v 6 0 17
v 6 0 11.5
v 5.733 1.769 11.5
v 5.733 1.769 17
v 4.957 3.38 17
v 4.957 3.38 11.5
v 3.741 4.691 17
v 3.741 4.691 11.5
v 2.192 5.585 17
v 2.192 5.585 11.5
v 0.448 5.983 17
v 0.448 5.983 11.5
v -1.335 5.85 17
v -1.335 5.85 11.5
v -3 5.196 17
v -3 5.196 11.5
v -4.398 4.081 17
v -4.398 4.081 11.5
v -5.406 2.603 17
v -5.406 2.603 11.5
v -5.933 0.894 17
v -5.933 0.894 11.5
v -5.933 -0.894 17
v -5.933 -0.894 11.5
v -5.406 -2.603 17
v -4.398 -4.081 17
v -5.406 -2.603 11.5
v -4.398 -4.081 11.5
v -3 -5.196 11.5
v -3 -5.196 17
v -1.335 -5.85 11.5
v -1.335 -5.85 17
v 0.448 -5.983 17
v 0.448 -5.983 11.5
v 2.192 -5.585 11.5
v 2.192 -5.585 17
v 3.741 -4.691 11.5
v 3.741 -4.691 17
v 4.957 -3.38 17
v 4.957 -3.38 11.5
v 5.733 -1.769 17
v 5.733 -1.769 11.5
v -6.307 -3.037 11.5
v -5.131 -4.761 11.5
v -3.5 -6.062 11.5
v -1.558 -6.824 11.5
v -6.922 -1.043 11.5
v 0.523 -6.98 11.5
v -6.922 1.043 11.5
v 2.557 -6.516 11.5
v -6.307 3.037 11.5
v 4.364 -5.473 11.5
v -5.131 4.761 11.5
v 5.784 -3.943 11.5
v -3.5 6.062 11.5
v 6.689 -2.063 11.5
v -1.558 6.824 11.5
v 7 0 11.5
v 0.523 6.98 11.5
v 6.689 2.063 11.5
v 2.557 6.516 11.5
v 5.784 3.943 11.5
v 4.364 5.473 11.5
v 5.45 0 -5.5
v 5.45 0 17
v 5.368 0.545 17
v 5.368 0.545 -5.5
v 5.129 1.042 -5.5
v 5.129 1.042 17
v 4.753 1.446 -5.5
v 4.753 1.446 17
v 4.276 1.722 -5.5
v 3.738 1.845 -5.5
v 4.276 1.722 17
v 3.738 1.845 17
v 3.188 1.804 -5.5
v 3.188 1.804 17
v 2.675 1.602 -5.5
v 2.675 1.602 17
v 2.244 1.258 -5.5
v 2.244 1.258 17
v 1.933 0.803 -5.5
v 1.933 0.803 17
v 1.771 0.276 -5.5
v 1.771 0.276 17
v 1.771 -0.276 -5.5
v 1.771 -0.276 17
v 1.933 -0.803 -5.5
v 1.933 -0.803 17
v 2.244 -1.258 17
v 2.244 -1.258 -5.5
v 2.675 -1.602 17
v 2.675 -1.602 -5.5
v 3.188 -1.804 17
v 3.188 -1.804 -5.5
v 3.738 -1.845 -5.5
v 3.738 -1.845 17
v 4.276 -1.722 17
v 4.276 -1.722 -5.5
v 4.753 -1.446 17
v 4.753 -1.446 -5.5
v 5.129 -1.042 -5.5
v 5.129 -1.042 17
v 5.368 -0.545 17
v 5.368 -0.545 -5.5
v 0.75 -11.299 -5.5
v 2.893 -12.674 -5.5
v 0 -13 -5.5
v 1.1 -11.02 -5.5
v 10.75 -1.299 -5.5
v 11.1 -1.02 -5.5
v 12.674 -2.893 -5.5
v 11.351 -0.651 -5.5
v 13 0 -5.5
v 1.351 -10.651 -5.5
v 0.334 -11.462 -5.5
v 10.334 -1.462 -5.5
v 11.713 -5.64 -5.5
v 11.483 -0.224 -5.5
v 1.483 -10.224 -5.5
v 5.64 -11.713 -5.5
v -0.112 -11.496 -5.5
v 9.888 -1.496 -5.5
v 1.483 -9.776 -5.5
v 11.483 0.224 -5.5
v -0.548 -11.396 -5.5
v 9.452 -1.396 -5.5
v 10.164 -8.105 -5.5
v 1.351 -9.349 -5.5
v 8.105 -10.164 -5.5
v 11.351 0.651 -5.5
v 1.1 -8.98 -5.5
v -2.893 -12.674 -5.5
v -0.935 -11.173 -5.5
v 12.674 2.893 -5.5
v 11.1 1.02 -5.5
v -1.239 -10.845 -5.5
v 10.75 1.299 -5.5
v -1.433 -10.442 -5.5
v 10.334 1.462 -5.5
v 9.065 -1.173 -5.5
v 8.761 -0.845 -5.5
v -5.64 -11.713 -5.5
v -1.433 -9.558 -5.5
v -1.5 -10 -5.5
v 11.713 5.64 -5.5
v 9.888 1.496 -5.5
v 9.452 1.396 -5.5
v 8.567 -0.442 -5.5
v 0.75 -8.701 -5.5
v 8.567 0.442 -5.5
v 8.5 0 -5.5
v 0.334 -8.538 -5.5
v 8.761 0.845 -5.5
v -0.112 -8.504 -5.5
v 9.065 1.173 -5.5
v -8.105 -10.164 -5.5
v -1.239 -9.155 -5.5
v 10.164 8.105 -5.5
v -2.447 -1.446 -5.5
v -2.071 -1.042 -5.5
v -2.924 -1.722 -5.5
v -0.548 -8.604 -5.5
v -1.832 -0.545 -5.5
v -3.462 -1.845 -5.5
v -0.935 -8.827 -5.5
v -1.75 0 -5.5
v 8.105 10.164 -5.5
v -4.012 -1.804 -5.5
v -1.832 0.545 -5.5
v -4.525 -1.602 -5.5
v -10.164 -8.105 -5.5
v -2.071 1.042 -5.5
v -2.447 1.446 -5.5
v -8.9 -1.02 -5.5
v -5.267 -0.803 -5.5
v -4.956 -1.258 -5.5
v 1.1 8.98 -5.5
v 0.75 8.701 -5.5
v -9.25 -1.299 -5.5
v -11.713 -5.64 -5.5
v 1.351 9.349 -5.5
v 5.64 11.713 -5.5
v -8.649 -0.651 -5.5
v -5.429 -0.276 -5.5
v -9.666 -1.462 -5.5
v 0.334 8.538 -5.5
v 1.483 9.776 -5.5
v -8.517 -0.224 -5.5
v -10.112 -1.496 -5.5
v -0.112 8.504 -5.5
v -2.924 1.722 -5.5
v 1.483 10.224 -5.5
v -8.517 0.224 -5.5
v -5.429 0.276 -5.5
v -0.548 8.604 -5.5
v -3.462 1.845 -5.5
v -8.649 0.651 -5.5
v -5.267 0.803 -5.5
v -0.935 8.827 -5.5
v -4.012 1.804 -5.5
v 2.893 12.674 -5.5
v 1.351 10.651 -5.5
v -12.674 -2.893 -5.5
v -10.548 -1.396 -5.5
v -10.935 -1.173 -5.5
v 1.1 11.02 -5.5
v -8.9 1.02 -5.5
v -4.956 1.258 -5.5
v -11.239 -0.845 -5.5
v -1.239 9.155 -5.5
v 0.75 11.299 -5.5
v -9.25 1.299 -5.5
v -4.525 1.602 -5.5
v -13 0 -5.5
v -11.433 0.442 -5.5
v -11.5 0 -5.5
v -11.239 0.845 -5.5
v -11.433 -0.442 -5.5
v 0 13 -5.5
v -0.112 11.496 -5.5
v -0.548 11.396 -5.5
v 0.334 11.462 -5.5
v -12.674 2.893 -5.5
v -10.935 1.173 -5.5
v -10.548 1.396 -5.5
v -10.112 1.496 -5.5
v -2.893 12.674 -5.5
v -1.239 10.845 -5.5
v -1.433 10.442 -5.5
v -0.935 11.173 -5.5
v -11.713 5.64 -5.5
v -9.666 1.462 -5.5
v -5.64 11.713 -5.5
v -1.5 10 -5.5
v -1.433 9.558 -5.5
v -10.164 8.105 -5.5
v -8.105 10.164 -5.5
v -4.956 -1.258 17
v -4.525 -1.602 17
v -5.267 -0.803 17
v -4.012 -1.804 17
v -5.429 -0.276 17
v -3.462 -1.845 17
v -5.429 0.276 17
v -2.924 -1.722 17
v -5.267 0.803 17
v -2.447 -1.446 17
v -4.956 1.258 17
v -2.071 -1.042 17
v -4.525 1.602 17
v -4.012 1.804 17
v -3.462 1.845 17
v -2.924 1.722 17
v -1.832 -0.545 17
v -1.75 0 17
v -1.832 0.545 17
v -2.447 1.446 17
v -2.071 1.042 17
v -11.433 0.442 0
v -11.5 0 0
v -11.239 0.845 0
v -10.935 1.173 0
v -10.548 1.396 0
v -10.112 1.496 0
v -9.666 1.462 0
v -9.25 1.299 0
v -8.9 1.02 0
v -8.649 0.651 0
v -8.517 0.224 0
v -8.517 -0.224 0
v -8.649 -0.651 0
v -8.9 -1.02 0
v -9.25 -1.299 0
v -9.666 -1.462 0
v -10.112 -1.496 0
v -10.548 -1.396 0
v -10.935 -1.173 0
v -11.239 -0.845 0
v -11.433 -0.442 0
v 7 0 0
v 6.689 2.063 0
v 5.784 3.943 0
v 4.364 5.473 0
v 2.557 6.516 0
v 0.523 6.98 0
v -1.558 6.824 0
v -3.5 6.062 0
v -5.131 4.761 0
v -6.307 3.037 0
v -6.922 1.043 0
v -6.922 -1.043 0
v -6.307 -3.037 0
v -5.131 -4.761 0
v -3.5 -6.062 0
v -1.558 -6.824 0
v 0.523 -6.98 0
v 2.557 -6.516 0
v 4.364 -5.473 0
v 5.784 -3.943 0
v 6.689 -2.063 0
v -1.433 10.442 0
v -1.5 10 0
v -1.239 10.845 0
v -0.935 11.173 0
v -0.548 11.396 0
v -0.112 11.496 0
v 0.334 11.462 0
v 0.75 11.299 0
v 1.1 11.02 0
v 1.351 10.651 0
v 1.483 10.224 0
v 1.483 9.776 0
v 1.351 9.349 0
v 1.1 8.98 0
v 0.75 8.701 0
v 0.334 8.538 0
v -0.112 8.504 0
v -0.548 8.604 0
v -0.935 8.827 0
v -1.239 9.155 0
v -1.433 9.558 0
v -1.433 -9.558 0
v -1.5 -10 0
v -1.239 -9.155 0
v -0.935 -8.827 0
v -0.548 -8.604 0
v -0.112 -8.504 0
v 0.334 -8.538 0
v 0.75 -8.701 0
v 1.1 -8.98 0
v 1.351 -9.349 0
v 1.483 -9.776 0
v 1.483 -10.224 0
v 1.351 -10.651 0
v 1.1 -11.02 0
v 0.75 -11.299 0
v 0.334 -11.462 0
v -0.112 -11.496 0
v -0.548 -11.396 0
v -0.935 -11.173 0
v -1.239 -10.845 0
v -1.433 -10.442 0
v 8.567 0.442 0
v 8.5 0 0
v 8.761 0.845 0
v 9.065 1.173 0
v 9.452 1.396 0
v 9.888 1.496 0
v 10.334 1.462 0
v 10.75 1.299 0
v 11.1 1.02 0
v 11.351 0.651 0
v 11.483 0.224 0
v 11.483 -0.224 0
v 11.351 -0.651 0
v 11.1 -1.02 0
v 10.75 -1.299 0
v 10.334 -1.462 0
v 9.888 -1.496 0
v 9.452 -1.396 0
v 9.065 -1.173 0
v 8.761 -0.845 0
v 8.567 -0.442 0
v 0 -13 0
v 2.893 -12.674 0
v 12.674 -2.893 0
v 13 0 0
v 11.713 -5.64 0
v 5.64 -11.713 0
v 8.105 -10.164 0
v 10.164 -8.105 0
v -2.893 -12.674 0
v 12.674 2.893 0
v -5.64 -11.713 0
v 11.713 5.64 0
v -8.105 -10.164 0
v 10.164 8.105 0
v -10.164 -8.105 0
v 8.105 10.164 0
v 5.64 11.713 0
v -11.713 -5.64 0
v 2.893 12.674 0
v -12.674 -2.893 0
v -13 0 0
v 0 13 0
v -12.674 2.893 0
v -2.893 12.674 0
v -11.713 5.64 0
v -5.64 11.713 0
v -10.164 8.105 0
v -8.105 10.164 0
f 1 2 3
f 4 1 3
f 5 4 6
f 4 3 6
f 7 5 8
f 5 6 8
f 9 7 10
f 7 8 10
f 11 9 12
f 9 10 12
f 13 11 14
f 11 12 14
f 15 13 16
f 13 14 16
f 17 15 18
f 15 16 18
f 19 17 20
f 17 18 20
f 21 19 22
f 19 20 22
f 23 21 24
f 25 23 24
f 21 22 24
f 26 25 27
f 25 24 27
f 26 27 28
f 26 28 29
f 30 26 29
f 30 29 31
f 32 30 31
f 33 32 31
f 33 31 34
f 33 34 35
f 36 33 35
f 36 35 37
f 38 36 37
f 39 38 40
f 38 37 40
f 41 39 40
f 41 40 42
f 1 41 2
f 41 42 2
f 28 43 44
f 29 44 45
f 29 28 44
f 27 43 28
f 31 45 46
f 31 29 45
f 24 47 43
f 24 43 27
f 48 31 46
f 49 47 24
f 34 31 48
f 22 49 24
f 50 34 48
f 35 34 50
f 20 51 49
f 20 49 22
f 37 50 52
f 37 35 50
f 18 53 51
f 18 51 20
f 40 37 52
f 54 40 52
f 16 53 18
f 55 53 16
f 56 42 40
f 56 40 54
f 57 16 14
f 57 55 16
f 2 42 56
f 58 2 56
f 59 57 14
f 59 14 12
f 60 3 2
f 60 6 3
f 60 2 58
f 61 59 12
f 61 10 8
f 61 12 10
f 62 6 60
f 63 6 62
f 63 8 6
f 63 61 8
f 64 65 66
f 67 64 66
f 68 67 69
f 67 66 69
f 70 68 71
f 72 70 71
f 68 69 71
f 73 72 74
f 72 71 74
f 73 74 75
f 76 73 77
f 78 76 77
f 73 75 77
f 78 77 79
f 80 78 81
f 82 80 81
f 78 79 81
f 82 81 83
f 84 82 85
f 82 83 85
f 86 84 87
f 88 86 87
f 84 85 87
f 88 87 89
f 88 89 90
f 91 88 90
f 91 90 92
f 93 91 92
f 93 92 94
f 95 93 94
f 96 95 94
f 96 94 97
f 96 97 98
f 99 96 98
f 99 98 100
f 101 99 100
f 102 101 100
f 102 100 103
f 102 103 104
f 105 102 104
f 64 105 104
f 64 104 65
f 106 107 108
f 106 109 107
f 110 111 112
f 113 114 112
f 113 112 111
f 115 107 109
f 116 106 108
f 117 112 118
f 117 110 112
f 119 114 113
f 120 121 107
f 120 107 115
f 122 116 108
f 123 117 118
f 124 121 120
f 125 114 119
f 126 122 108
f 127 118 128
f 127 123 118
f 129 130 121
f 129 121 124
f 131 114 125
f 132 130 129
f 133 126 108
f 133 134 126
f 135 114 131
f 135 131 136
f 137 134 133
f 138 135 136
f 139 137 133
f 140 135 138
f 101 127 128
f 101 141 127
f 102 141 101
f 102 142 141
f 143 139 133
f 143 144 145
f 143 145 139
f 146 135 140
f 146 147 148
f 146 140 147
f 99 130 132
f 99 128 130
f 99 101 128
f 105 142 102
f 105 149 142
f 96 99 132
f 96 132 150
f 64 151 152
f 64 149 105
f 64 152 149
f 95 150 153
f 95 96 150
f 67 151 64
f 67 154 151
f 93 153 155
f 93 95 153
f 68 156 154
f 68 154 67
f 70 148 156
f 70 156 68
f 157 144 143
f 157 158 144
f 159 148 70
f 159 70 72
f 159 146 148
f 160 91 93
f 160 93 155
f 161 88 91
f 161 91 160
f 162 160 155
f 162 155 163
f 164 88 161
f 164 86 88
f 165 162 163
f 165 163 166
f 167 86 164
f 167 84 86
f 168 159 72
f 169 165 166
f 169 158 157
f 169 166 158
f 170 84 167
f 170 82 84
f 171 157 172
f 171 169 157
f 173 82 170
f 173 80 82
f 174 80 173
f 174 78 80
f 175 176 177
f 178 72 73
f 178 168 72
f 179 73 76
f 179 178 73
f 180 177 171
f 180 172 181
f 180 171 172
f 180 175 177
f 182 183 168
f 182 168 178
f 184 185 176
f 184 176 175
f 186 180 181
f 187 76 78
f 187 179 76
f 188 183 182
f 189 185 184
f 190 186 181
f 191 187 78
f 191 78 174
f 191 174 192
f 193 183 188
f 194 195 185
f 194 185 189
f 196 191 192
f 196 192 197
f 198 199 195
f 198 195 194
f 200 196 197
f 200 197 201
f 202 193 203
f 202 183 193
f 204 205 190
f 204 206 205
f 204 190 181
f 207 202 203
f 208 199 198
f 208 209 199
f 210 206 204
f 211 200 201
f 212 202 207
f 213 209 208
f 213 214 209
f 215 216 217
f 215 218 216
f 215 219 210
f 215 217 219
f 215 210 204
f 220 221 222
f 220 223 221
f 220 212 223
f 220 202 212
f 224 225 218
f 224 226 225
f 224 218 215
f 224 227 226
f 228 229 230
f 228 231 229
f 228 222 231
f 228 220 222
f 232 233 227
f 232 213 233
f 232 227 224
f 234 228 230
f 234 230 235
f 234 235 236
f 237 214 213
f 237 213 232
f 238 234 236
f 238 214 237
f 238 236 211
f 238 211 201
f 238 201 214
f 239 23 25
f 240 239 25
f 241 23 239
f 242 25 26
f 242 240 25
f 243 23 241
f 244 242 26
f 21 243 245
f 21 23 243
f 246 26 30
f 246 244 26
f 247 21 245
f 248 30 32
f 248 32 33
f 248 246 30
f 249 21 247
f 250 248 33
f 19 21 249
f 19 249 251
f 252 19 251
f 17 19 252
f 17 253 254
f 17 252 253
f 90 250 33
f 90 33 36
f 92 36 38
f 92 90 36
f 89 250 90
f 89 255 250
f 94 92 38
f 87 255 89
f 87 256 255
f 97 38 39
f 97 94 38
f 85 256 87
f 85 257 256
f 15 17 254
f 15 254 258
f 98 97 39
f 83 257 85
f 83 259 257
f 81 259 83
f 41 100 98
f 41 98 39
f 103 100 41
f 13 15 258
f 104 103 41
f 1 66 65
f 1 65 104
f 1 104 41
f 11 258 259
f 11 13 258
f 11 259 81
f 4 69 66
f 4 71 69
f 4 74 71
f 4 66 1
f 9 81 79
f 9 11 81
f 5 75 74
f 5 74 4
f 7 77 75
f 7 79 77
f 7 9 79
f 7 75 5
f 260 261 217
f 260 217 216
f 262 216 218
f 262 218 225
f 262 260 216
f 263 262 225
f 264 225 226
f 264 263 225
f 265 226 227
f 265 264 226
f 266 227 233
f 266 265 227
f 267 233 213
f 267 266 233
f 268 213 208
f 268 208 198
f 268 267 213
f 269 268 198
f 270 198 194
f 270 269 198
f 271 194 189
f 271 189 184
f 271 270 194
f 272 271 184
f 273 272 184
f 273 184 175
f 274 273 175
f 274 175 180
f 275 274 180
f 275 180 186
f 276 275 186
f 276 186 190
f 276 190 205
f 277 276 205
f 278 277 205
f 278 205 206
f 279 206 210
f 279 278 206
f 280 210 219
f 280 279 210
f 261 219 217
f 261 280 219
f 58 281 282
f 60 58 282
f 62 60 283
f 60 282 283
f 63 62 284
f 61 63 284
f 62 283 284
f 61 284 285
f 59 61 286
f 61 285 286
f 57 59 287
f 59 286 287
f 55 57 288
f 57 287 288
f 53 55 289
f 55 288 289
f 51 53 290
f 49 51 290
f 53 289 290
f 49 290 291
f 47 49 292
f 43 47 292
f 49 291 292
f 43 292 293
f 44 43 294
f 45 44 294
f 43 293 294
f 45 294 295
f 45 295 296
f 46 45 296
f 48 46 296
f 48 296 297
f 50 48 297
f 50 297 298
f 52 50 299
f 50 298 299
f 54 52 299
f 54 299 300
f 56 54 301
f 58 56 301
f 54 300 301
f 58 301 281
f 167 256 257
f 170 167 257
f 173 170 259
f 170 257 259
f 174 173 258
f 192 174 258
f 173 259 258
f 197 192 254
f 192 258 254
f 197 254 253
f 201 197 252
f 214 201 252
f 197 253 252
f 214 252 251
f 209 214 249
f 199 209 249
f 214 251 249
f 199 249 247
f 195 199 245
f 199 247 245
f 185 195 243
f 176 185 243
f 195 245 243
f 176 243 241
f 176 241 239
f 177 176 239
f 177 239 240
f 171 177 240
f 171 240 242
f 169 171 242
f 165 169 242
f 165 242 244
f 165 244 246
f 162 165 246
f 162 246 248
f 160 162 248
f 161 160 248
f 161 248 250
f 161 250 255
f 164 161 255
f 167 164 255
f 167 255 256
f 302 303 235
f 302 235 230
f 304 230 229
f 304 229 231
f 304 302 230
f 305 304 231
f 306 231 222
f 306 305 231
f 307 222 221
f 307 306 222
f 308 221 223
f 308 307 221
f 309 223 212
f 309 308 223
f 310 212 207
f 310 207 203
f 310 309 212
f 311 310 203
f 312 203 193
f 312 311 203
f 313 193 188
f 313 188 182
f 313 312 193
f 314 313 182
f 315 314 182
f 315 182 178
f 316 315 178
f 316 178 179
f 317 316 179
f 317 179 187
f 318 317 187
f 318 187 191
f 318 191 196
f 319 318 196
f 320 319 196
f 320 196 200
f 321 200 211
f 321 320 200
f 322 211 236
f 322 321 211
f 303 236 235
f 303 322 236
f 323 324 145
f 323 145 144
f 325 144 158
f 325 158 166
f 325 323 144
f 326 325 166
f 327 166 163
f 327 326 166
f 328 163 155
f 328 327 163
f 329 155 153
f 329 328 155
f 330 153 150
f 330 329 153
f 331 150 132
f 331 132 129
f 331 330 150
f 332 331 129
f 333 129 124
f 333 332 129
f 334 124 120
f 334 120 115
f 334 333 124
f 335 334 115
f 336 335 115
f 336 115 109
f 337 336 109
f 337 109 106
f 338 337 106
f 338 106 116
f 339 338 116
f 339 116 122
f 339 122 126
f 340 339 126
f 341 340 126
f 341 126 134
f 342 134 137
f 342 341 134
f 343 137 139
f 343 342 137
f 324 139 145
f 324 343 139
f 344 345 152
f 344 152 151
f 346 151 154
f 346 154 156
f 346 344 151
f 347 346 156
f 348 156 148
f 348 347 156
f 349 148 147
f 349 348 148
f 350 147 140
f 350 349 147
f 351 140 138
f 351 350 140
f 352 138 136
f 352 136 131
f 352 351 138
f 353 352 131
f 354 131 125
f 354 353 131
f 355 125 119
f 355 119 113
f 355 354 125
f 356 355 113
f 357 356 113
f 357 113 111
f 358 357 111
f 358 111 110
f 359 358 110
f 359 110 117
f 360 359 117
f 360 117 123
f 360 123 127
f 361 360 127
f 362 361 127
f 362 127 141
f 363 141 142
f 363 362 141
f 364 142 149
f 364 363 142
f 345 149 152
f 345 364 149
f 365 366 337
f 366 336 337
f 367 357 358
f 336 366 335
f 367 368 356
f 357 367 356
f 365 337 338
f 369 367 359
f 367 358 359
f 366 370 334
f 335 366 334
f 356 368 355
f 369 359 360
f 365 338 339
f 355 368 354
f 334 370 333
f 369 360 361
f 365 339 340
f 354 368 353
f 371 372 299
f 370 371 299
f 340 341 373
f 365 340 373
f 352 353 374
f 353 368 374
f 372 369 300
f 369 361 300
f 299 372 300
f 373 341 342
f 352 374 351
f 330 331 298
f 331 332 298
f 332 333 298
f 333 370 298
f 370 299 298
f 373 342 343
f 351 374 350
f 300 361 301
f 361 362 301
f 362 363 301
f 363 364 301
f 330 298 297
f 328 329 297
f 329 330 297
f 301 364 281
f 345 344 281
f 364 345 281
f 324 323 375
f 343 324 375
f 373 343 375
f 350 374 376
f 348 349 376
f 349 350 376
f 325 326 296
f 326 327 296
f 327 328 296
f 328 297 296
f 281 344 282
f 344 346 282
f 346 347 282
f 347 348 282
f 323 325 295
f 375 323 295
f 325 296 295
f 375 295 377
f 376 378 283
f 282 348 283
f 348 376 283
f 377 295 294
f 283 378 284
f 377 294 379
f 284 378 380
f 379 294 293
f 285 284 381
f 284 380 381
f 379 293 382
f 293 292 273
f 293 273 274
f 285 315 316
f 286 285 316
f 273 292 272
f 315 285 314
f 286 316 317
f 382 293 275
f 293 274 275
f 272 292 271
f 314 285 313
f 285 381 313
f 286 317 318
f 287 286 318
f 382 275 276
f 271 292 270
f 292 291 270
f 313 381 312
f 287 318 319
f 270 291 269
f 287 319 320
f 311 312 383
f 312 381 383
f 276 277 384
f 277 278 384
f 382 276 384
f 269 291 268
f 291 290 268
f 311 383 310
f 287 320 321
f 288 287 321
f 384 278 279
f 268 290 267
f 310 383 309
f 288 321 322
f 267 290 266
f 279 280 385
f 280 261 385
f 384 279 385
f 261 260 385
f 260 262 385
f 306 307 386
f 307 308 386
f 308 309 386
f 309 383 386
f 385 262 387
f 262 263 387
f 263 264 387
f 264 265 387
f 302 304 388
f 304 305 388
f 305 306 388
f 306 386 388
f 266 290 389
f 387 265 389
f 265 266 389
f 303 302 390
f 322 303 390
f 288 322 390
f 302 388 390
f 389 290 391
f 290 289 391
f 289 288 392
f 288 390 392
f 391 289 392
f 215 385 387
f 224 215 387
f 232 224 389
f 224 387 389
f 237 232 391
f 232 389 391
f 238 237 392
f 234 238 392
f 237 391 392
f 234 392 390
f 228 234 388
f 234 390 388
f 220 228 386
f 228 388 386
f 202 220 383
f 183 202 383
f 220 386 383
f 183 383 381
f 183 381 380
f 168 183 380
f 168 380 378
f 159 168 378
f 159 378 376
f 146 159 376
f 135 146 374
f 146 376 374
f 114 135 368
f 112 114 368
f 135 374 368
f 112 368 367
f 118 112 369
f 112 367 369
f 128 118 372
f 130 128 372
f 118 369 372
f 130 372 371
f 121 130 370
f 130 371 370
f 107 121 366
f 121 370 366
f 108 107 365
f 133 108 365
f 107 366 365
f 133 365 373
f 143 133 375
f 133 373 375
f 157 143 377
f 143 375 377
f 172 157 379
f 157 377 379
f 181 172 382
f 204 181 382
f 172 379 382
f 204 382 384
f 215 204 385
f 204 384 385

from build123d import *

# Parameters (mm, degrees)
SKETCH1_R           = 7
BOSS_EXTRUDE1_DEPTH = 11.5
SKETCH2_R           = 6
BOSS_EXTRUDE2_DEPTH = 5.5
SKETCH3_R           = 13
SKETCH3_R_2         = 1.5
BOSS_EXTRUDE3_DEPTH = 5.5
SKETCH4_R           = 1.85
CUT_EXTRUDE1_DEPTH  = 30.055980452


with BuildPart() as part:
    # Sketch1 → Boss-Extrude1 (new body)
    with BuildSketch(Plane.XY):
        Circle(SKETCH1_R)
    extrude(amount=BOSS_EXTRUDE1_DEPTH)

    # Sketch2 → Boss-Extrude2 (add)
    with BuildSketch(Plane.XY.offset(11.5)):
        Circle(SKETCH2_R)
    extrude(amount=BOSS_EXTRUDE2_DEPTH)

    # Sketch3 → Boss-Extrude3 (add)
    with BuildSketch(Plane(origin=(0, 0, 0), x_dir=(-1, 0, 0), z_dir=(0, 0, -1))):
        Circle(SKETCH3_R)
        with Locations((10, 0)):
            Circle(SKETCH3_R_2, mode=Mode.SUBTRACT)
        with Locations((0, -10)):
            Circle(SKETCH3_R_2, mode=Mode.SUBTRACT)
        with Locations((-10, 0)):
            Circle(SKETCH3_R_2, mode=Mode.SUBTRACT)
        with Locations((0, 10)):
            Circle(SKETCH3_R_2, mode=Mode.SUBTRACT)
    extrude(amount=BOSS_EXTRUDE3_DEPTH)

    # Sketch4 → Cut-Extrude1 (cut, through all)
    with BuildSketch(Plane.XY.offset(17)):
        with Locations((3.6, -3.04e-07)):
            Circle(SKETCH4_R)
        with Locations((-3.6, 0)):
            Circle(SKETCH4_R)
    extrude(amount=-CUT_EXTRUDE1_DEPTH, mode=Mode.SUBTRACT)


solid = part.part
